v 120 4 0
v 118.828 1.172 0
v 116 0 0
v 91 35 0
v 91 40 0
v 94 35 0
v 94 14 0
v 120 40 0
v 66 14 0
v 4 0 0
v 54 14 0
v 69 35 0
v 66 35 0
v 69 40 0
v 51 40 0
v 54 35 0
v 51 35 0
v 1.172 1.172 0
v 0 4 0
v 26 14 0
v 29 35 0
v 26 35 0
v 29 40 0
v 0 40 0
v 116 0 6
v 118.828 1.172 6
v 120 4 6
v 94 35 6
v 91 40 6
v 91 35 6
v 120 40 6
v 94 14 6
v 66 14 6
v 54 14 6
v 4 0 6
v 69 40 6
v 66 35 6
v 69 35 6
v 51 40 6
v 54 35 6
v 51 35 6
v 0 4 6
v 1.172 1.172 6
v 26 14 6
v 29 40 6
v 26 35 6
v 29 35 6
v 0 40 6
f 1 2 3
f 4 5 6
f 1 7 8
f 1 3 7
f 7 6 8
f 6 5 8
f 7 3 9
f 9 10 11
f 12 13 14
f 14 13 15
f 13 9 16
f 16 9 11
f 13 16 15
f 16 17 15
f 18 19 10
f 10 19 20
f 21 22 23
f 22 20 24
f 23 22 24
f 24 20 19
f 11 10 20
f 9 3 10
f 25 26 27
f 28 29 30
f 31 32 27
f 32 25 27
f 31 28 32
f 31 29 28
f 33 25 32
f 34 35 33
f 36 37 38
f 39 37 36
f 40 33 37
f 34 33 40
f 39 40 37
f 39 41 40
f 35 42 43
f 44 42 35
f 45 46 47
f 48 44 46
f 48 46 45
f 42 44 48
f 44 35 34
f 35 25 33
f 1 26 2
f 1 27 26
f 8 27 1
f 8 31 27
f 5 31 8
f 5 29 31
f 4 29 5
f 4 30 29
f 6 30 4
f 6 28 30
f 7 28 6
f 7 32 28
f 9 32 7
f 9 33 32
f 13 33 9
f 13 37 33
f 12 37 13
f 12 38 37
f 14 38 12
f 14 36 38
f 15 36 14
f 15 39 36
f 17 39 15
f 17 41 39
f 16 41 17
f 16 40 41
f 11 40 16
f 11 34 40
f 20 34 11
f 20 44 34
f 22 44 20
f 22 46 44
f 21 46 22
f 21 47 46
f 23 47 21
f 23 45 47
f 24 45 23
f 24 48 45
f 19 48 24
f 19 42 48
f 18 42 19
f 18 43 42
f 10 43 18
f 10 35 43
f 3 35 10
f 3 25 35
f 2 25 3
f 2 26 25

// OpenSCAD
$fn = 32;

// ----------------------------------------------------------------------
// Oversize slot bar: 120 mm bar with 2 oversize windows
// ----------------------------------------------------------------------

// --- parameters (mm) ---
profile_height = 6;       // extrusion height
profile_points = 24;      // points of the closed outline

profile = [[0, 4], [1.172, 1.172], [4, 0], [116, 0], [118.828, 1.172], [120, 4], [120, 40], [91, 40], [91, 35], [94, 35], [94, 14], [66, 14], [66, 35], [69, 35], [69, 40], [51, 40], [51, 35], [54, 35], [54, 14], [26, 14], [26, 35], [29, 35], [29, 40], [0, 40]];  // single closed polygon, 24 points, counter clockwise

// --- the one profile operation ---
linear_extrude(height = profile_height) polygon(points = profile);
